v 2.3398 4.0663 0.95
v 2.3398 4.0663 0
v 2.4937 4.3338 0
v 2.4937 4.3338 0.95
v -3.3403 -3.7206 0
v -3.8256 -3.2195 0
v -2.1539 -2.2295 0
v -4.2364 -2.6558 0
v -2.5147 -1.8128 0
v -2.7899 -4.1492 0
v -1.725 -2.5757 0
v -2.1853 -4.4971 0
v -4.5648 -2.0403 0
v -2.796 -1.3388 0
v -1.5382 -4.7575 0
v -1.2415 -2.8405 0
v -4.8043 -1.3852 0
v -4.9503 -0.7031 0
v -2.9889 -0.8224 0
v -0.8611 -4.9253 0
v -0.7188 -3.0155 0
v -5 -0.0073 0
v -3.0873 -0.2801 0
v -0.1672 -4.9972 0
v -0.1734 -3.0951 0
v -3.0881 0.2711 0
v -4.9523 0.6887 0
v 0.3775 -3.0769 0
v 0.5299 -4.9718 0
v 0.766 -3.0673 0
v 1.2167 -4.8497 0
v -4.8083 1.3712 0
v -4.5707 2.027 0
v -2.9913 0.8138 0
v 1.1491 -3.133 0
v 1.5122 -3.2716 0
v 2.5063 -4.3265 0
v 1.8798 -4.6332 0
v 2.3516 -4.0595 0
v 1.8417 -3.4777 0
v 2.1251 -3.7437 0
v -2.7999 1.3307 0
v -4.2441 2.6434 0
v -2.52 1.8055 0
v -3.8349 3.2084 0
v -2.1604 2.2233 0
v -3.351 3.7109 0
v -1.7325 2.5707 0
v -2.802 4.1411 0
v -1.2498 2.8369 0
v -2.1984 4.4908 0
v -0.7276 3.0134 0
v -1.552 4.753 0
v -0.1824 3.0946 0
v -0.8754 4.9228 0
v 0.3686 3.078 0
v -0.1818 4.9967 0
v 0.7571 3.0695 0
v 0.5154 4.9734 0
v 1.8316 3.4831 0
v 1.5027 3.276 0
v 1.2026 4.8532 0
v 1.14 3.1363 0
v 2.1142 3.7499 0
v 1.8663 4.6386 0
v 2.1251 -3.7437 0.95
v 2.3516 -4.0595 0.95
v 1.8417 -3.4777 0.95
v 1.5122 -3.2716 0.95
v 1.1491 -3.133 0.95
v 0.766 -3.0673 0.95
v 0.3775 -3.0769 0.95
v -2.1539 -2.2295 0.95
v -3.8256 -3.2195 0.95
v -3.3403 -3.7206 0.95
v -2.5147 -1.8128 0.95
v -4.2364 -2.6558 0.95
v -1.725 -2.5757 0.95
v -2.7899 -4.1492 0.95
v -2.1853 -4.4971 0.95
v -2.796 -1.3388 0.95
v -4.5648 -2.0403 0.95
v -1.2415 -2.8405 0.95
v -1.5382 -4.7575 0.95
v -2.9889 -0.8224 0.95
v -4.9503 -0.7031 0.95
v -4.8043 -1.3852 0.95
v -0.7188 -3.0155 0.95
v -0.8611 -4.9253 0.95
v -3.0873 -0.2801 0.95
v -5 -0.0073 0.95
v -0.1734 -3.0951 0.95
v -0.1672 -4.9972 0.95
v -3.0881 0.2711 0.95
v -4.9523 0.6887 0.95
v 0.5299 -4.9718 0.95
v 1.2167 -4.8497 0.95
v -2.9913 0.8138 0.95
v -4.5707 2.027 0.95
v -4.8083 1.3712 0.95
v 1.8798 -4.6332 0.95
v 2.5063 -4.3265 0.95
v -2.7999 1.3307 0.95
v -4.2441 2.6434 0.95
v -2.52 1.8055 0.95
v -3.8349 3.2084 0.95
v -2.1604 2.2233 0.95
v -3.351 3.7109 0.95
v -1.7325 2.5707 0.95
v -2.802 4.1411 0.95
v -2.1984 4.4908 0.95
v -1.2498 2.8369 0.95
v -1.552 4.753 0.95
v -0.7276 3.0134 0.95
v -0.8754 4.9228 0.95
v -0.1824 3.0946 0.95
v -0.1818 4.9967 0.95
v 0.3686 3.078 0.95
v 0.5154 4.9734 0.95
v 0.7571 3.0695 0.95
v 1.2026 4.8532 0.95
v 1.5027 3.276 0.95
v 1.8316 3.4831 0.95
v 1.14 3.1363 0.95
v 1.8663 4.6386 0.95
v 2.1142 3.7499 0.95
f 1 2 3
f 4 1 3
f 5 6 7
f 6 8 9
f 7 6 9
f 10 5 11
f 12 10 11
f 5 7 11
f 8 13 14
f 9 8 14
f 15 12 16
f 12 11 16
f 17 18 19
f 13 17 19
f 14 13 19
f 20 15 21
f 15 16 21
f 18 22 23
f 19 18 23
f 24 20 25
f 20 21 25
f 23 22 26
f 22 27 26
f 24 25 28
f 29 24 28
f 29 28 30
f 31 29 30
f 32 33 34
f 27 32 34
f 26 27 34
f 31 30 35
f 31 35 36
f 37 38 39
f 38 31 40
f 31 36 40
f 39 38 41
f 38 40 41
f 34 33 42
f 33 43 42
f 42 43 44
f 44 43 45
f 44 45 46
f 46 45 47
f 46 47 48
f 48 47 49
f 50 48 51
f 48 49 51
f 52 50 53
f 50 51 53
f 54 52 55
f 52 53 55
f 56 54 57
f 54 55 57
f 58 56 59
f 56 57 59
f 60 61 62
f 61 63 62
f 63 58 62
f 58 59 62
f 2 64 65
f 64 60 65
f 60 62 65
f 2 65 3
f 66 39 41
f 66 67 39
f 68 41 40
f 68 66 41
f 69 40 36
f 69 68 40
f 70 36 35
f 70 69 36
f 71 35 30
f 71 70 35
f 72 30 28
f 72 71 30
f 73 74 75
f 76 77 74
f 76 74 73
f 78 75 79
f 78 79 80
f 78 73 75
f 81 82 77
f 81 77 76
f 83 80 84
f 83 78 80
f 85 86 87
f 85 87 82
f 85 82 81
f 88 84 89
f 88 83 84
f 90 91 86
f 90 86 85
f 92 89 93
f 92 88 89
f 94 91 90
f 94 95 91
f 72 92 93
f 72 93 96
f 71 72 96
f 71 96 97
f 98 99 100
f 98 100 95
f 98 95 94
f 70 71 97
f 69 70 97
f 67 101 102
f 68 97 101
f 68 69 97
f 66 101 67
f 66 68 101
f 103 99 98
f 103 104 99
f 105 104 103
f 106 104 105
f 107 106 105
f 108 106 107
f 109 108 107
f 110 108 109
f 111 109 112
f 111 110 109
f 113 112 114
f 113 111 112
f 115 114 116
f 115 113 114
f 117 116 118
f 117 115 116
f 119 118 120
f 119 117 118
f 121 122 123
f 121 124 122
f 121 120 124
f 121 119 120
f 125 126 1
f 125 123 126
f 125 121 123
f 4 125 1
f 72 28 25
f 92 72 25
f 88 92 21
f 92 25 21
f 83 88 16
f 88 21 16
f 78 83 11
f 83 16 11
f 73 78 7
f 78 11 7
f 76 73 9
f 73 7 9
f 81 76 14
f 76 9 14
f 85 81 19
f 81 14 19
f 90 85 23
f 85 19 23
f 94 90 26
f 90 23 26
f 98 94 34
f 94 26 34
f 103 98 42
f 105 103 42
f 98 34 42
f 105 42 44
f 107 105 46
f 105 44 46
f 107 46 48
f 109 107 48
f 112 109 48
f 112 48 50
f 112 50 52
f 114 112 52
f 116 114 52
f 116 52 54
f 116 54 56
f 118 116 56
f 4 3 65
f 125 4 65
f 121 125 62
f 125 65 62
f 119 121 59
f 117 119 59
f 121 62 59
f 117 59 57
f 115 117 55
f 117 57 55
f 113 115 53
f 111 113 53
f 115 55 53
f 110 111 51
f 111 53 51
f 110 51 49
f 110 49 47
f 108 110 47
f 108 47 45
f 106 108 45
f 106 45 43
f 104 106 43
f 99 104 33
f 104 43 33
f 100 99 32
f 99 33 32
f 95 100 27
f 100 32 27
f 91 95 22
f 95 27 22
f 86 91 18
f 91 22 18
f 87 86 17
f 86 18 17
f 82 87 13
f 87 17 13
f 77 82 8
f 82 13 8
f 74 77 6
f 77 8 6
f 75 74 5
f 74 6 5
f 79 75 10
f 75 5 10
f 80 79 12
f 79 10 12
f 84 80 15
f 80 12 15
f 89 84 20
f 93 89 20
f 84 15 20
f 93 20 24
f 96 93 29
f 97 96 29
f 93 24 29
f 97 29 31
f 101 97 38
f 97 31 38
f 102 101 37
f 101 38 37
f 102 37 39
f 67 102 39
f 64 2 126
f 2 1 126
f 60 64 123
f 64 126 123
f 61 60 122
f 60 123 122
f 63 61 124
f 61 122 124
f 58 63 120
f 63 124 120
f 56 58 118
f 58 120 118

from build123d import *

# Parameters (mm, degrees)
BOSS_EXTRUDE1_DEPTH = 0.95
FILLET1_R           = 2


with BuildPart() as part:
    # Sketch1 → Boss-Extrude1 (new body)
    with BuildSketch(Plane.XY):
        with BuildLine():
            Line((1.546099973, 2.686926659), (2.493709634, 4.333752676))
            ThreePointArc((2.493709634, 4.333752676), (-4.999994729, -0.007260445), (2.506285094, -4.326492231))
            Line((2.506285094, -4.326492231), (1.553896759, -2.682425183))
            ThreePointArc((1.553896759, -2.682425183), (-3.099996732, -0.004501476), (1.546099973, 2.686926659))
        make_face()
    extrude(amount=BOSS_EXTRUDE1_DEPTH)

    # Fillet1
    fillet1_edges = [part.edges().sort_by_distance(p)[0] for p in [
        (1.546099973, 2.686926659, 0.475),
        (1.553896759, -2.682425183, 0.475),
    ]]
    fillet(fillet1_edges, radius=FILLET1_R)


solid = part.part
